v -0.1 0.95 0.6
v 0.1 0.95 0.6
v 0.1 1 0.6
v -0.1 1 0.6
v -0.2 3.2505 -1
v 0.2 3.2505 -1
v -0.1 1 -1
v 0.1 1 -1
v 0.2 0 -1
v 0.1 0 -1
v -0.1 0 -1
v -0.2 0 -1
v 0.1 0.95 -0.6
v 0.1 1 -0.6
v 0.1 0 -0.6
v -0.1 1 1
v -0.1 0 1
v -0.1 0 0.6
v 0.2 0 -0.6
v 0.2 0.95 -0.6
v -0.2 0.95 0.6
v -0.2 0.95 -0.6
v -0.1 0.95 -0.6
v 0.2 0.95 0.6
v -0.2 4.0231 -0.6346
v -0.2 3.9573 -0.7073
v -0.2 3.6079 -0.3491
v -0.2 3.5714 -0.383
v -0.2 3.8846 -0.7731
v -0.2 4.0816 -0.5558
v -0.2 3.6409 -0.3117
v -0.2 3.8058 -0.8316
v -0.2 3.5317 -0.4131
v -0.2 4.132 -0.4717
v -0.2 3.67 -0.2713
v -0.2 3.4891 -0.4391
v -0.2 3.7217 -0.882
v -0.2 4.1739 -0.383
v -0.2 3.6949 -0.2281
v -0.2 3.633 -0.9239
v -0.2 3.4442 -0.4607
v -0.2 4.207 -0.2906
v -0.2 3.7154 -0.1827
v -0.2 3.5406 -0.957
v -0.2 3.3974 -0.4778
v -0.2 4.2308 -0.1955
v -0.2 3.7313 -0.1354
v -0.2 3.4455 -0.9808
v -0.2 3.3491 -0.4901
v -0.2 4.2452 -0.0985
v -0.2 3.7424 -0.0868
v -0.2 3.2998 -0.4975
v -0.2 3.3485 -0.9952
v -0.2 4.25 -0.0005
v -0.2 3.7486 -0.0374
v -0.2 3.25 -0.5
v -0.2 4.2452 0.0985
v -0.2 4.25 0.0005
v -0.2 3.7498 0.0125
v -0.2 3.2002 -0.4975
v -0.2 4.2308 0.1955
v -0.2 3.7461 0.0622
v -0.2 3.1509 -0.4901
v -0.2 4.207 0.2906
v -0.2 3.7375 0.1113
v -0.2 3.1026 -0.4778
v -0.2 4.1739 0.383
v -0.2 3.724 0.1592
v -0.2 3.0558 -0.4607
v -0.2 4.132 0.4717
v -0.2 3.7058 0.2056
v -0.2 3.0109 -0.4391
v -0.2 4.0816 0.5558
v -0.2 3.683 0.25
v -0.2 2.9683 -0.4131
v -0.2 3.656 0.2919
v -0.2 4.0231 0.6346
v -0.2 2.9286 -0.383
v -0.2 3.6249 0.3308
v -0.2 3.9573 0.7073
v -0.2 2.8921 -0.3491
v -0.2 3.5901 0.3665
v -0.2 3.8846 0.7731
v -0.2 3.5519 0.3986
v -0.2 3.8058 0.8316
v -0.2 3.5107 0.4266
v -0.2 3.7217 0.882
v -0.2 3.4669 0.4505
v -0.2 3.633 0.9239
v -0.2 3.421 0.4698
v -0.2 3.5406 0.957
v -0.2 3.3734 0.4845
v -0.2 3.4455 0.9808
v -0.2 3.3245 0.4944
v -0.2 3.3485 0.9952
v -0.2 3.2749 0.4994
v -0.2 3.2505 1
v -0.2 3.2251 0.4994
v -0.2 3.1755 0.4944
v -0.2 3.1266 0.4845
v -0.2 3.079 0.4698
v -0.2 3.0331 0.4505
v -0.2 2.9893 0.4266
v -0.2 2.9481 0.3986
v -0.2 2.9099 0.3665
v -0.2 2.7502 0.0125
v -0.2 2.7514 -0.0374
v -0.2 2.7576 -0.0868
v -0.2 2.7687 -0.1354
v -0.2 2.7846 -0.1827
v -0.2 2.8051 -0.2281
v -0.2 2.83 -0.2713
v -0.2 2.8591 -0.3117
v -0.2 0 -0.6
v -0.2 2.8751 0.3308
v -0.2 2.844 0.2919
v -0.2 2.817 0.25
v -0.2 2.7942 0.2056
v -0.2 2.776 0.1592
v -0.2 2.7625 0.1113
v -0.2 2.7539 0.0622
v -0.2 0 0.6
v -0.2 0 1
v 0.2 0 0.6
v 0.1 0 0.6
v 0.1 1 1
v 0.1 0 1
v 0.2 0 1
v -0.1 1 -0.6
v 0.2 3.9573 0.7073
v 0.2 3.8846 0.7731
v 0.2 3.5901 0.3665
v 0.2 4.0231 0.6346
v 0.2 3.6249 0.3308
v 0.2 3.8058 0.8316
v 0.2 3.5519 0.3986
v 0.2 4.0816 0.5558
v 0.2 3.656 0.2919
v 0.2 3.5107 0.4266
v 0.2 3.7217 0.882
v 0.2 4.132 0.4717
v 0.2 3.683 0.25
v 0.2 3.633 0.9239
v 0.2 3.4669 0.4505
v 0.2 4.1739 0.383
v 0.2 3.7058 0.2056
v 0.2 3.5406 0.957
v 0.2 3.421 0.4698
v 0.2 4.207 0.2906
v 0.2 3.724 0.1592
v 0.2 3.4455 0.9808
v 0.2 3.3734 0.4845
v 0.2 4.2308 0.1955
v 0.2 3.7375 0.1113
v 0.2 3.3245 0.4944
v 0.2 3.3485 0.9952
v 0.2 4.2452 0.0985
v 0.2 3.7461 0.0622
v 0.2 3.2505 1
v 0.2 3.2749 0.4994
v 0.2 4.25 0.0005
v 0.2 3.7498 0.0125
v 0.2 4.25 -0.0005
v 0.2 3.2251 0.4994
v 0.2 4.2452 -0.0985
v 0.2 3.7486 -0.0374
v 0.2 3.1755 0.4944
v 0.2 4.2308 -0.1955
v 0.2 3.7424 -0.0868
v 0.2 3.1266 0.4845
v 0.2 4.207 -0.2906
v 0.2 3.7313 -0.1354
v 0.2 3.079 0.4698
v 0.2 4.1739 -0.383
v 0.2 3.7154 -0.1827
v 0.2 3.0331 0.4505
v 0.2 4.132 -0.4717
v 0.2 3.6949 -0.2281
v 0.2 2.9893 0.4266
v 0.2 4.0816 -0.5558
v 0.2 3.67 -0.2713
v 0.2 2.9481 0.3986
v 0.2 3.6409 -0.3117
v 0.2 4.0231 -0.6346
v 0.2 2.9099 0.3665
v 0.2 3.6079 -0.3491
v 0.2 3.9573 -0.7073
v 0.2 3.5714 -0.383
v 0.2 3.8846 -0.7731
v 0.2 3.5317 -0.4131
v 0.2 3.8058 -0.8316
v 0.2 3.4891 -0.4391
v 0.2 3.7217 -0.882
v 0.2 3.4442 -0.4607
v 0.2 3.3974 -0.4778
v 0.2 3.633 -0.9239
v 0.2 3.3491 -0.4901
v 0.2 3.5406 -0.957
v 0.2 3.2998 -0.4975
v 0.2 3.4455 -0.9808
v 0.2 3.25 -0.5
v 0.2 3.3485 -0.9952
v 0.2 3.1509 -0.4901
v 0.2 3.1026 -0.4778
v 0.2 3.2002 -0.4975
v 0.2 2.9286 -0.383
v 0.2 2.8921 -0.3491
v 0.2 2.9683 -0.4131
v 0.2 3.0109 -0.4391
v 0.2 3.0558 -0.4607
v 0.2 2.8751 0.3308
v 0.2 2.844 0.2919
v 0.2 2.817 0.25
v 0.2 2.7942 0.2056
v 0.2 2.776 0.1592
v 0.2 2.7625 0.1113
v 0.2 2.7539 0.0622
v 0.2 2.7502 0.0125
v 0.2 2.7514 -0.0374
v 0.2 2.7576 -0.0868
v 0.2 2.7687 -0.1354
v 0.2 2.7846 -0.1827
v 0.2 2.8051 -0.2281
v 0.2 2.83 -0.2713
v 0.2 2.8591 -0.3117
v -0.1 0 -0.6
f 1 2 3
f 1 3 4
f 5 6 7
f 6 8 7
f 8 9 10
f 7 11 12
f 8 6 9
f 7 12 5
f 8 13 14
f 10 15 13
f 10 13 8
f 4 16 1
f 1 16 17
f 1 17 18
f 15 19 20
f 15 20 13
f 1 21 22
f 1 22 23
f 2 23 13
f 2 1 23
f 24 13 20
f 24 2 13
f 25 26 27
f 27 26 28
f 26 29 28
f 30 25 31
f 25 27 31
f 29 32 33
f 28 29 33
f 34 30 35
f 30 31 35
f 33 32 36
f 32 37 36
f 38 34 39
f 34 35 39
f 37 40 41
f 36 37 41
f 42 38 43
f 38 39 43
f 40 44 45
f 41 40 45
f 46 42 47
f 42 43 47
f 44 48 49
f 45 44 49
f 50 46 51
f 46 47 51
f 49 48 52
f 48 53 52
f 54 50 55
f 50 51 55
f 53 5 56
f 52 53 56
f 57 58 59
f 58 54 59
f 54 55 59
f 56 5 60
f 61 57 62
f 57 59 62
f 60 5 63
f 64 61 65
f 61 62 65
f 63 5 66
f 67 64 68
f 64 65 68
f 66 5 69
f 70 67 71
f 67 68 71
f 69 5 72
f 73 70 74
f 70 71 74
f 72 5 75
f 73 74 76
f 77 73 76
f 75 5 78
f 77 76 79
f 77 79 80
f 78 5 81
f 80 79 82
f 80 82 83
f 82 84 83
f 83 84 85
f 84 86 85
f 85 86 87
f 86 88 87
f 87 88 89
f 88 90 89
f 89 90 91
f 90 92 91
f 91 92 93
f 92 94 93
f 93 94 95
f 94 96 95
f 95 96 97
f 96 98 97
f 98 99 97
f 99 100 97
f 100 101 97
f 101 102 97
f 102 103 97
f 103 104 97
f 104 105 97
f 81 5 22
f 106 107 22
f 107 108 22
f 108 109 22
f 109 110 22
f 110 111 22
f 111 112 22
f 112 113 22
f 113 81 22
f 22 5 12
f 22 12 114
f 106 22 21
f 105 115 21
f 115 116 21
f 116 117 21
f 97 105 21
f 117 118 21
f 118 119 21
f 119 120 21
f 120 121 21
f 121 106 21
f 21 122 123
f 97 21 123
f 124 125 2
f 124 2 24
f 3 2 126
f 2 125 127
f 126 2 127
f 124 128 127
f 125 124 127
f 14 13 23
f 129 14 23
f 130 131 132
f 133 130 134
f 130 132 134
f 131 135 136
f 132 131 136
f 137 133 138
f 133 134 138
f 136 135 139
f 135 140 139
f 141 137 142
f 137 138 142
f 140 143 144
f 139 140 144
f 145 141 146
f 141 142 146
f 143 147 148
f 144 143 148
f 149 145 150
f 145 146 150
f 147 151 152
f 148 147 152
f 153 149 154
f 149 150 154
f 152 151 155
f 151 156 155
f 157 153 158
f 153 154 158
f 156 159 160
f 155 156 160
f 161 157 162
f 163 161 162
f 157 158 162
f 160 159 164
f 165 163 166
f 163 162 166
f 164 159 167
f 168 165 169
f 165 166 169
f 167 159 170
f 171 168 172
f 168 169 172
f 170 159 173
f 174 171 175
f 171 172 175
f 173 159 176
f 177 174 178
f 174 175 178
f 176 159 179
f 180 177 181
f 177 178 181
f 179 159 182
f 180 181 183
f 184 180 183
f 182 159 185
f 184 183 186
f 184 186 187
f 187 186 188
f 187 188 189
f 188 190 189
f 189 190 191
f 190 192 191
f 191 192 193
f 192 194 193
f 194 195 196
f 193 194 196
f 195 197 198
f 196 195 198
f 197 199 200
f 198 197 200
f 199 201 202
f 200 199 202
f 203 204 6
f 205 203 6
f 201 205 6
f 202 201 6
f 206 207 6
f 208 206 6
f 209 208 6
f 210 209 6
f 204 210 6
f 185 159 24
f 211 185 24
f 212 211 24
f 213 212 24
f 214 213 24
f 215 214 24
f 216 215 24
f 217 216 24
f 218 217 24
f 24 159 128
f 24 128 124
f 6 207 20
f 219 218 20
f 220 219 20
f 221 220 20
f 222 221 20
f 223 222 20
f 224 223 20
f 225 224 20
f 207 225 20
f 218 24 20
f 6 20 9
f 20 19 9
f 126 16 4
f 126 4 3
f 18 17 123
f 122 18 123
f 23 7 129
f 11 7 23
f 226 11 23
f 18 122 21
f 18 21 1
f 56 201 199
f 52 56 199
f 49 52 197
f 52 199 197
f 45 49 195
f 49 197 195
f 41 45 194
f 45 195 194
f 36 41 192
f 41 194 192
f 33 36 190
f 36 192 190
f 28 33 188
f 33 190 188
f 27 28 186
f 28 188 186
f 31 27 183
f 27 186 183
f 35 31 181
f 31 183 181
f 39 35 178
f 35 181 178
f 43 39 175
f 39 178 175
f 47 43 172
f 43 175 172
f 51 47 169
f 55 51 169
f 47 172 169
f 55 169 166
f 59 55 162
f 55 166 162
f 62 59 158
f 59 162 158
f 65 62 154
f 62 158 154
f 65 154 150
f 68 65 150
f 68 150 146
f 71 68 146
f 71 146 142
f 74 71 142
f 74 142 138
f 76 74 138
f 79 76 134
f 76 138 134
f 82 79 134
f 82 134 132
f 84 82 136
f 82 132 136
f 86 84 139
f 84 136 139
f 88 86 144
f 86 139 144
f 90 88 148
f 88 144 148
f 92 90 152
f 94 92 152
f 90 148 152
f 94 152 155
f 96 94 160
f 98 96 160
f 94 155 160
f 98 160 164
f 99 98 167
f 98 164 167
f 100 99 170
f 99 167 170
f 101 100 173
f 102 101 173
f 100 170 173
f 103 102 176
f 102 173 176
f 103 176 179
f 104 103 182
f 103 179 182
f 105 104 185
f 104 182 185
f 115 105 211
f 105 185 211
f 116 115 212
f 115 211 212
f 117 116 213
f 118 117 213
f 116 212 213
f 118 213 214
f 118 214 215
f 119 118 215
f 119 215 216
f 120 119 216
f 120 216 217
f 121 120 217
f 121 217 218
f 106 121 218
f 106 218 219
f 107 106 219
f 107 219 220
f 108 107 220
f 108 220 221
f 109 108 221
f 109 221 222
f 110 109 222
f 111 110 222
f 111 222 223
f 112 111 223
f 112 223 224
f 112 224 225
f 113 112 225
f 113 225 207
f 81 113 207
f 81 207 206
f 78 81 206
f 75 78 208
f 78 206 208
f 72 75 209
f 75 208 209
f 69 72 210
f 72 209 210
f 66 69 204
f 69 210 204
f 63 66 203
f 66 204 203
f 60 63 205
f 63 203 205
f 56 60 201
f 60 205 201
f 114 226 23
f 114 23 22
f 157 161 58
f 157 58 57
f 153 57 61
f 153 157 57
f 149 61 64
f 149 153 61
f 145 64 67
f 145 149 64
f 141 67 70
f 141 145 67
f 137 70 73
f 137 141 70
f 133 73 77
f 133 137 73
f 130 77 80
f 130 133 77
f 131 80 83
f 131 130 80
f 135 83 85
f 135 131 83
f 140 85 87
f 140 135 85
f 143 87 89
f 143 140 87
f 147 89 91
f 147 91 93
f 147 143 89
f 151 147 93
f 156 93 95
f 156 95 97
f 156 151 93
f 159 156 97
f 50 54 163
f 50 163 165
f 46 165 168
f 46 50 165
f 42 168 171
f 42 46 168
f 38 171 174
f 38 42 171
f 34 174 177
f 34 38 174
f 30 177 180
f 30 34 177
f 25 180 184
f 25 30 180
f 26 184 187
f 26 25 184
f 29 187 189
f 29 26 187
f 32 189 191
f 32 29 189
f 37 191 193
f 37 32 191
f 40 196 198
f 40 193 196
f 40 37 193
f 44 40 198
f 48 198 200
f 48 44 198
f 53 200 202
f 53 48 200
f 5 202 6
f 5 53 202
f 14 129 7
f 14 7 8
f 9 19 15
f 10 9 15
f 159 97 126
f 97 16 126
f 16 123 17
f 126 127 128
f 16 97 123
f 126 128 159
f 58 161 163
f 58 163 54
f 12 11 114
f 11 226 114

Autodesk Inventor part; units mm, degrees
ref_plane "YZ Plane" through (0, 0, 0) normal (1, 0, 0) x (0, 1, 0)
ref_plane "XZ Plane" through (0, 0, 0) normal (0, 1, 0) x (-1, 0, 0)
ref_plane "XY Plane" through (0, 0, 0) normal (0, 0, 1) x (1, 0, 0)
sketch "Esboço1" plane through (0, 0, 0) normal (0, 1, 0) x (-1, 0, 0)
  line L0 (0.2, 1) -> (-0.2, 1)
  line L1 (-0.2, 1) -> (-0.2, -1)
  line L2 (-0.2, -1) -> (0.2, -1)
  line L3 (0.2, -1) -> (0.2, 1)
  line L4 (0.2, 1) -> (-0.2, -1) construction
  line L5 (-0.2, 1) -> (0.2, -1) construction
  point P0 (0, 0)
  dimension "d0" = 0.4
  dimension "d1" = 2
extrude "Extrusão1" add sketch "Esboço1" along normal blind 4.25
sketch "Esboço2" plane through (0.2, 0, 1) normal (1, 0, 0) x (0, 0, -1)
  line L0 (0, 4.25) -> (2, 4.25) projected
  line L1 (1, 4.25) -> (1, 3.25)
  circle A0 centre (1, 3.25) radius 0.5
  point P0 (1, 0)
  dimension "d4" = 1
  dimension "d5" = 1
extrude "Extrusão2" cut sketch "Esboço2" against normal blind 4.25
fillet "Arredondamento1" radius 1 2 edges at (0, 4.25, 1) (0, 4.25, -1)
sketch "Esboço3" plane through (0, 0, 0) normal (0, -1, 0) x (1, 0, 0)
  line L0 (0.2, 1) -> (0.2, -1) projected
  line L1 (-0.2, 0.6) -> (0.2, 0.6)
  line L2 (0.2, 0.6) -> (0.2, -0.6)
  line L3 (0.2, -0.6) -> (-0.2, -0.6)
  line L4 (-0.2, -0.6) -> (-0.2, 0.6)
  line L5 (-0.2, 0.6) -> (0.2, -0.6) construction
  line L6 (0.2, 0.6) -> (-0.2, -0.6) construction
  point P0 (0, 0)
  dimension "d9" = 1.2
extrude "Extrusão3" cut sketch "Esboço3" against normal blind 0.95
sketch "Esboço4" plane through (0, 0, 0) normal (0, -1, 0) x (1, 0, 0)
  line L0 (0.2, -0.6) -> (-0.2, -0.6) projected
  line L1 (0.1, -1) -> (-0.1, -1)
  line L2 (-0.1, -1) -> (-0.1, -0.6)
  line L3 (-0.1, -0.6) -> (0.1, -0.6)
  line L4 (0.1, -0.6) -> (0.1, -1)
  line L5 (0.1, -1) -> (-0.1, -0.6) construction
  line L6 (-0.1, -1) -> (0.1, -0.6) construction
  line L7 (-0.2, -0.5) -> (-0.2, 0.5) projected
  line L8 (-0.2, 0) -> (0.2, 0)
  line L9 (0.2, 0.5) -> (0.2, -0.5) projected
  line L10 (0.2, 0.6) -> (-0.2, 0.6)
  line L11 (0.1, 1) -> (-0.1, 1)
  line L12 (-0.1, 1) -> (-0.1, 0.6)
  line L13 (-0.1, 0.6) -> (0.1, 0.6)
  line L14 (0.1, 0.6) -> (0.1, 1)
  line L15 (0.1, 1) -> (-0.1, 0.6) construction
  line L16 (-0.1, 1) -> (0.1, 0.6) construction
  line L17 (-0.2, -1) -> (-0.2, -0.6) projected
  point P0 (0, 0)
  point P1 (0, -0.8)
  point P2 (0, 0.8)
  point P3 (0.1, -0.6)
  point P4 (0.1, 0.6)
  dimension "d12" = 0.2
  dimension "d15" = 0.1
extrude "Extrusão4" cut sketch "Esboço4" against normal blind 1
properties part number "Terminais"
